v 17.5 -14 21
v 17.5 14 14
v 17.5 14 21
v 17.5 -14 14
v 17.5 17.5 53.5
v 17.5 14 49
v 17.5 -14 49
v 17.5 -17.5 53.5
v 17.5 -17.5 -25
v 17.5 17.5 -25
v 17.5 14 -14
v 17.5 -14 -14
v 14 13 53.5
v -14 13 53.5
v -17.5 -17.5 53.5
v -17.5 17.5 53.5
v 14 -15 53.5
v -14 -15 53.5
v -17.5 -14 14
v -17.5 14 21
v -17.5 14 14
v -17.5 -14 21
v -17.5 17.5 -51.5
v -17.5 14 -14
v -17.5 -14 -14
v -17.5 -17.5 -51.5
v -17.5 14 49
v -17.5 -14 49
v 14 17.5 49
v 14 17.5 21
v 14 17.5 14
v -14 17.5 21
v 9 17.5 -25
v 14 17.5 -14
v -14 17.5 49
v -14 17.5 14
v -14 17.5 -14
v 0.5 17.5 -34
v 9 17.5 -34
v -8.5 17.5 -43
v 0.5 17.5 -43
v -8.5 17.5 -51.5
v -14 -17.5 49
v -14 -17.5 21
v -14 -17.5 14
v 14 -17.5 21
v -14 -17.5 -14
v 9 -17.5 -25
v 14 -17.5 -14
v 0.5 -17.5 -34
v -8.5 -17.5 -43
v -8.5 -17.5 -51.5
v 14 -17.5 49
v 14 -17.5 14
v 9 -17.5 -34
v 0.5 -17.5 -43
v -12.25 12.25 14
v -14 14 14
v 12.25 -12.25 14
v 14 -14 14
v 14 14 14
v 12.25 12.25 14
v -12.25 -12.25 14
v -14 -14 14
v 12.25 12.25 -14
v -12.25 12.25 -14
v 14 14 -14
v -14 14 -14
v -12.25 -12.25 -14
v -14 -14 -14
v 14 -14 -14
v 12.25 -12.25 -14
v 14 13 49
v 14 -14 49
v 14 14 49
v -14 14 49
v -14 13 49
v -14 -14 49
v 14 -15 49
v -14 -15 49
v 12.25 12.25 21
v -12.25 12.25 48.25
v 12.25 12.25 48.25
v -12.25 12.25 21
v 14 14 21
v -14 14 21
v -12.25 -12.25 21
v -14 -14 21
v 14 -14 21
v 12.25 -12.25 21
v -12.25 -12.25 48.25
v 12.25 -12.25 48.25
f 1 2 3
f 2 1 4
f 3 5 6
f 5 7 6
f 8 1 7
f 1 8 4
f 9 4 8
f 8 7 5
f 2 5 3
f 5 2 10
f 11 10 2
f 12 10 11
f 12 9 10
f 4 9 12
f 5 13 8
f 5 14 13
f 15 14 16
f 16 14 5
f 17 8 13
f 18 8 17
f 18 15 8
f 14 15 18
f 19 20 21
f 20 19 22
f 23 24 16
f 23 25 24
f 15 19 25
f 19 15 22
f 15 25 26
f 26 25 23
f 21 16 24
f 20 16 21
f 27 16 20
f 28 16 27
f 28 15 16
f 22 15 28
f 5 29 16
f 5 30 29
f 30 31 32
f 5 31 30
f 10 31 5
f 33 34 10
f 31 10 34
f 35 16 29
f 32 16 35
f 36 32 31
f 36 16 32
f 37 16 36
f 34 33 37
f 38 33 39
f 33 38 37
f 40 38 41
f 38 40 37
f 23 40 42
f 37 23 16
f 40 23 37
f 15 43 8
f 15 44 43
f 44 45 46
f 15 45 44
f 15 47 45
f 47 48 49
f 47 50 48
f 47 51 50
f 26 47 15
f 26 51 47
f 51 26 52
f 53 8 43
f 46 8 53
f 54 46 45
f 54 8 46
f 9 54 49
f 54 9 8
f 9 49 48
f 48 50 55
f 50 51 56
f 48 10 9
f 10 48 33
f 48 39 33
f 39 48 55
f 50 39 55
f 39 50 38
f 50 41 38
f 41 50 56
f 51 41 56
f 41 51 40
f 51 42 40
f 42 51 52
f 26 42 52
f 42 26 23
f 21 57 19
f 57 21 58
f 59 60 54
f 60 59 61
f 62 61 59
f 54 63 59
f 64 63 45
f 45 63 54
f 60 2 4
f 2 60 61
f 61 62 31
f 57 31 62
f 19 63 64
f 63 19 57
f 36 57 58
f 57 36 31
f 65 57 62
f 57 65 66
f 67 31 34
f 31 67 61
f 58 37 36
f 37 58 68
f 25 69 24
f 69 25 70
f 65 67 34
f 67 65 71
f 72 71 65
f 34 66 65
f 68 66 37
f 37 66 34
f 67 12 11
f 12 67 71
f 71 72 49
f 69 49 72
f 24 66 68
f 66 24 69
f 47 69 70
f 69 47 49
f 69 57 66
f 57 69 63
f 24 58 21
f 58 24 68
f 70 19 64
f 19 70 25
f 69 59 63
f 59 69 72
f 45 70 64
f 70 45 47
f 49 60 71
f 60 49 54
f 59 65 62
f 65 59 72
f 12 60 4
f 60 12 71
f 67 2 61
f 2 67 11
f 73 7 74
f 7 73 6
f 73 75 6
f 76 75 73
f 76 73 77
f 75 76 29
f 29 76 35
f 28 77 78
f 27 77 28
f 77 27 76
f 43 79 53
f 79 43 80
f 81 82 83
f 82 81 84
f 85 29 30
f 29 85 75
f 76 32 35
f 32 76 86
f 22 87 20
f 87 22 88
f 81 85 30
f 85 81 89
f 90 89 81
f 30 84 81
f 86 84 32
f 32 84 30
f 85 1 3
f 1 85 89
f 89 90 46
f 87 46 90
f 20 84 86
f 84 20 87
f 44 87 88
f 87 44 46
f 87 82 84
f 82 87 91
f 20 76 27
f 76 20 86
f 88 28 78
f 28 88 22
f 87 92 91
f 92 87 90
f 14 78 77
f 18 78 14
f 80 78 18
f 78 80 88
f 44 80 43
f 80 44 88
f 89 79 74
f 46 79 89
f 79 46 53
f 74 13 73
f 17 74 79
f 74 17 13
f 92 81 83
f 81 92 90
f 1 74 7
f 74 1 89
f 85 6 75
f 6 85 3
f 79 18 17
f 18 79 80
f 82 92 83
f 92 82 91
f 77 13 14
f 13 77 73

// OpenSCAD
// file: modules.scad
offset = [0,8,0];
zoom = [0.8,0.8,1];

module white( filename, text)
{
    translate([0,4,0])   scale(zoom)
    rotate([180,0,-90]) 
    union(){ 
        translate([-14,-6.4,-2.5])   rotate([0,0,90])  linear_extrude(5)  text (text,font="bold",size=3.5); 
        intersection() 
        {    
            cube([35,35,5],center=true); 
            translate([1.5,0,2.6])   scale([0.14,0.14,-1])surface(file = filename, center = true); 
        } 
    } 

};

module black( filename, text)
{
    translate([0,4,0])   scale(zoom)
    rotate([180,0,-90]) 
    difference() 
    {    
        cube([35,35,5],center=true); 
        translate([1.5,0,2.6])    scale([0.14,0.14,-1]) surface(file = filename, center = true);
        translate([-14,-6.4,-2.5])   rotate([0,0,90])  linear_extrude(6)  text (text,font="bold",size=3.5);
    } 
}

module shape()
{
    translate([0,8,0])   scale(zoom) rotate([180,0,0]) 
    {
        rotate([0,0,90]) translate([5,0,0])  cube([35,35,5.5],center=true);  
        // use for help
//        linear_extrude(5)  translate([-9,-4,0])   text("B",size=20);
    }
}

module cube_appendix()
{
    difference()
    {
        union()
        {
            translate([0,0,1])
            {
                cube([35,35,35],center=true);
                 translate([0,0,7]) cylinder(r=10,h=30,center=true);
            }
        }
        translate([0,0,-24]) cylinder(r=10,h=30,center=true);
    }
}

module blue_stairs()
{
        union()
        {
            translate([0,0,1])cube([35,35,35],center=true);
            translate([0,0,-20.5])cube([35,35,9],center=true);            
            translate([-4.25,0,-29.5])cube([35-8.5,35,9],center=true);            
            translate([-8.5,0,-29.5-9])cube([35-17,35,9],center=true);            
            translate([-13,0,-29.5-17.5])cube([35-26,35,9],center=true);            

        }
}

module green_stairs()
{
        union()
        {
            translate([0,0,1+35/2])cube([35,35,70],center=true);
            translate([0,0,-20.5])cube([35,35,9],center=true);            
            translate([-4.25,0,-29.5])cube([35-8.5,35,9],center=true);            
            translate([-8.5,0,-29.5-9])cube([35-17,35,9],center=true);            
            translate([-13,0,-29.5-17.5])cube([35-26,35,9],center=true);            

        }
}

module support()
{
    difference()
    {
        translate([10,-1.5,-12])
        {
            difference()
            {
                cube([211,51.5,22],center=true);
                translate([0,0,17]) cube([211,40,20],center=true);
                
                
            }
        }
        translate([106-8,-2.5,-10])    cylinder(r=11,h=10,$fn=50);
        translate([70.6-8,-2.5,-10])    cylinder(r=11,h=10,$fn=50);
        translate([35.3-8,-2.5,-10])    cylinder(r=11,h=10,$fn=50);
        translate([-8,-2.5,-10])    cylinder(r=11,h=10,$fn=50);
        translate([-43,-2.5,-10])    cylinder(r=11,h=10,$fn=50);
        translate([-78,-2.5,-10])    cylinder(r=11,h=10,$fn=50);
    }
}

module tower()
{
    difference()
    {
        union()
        {
            translate([0,0,3-35/2])cube([35,35,70],center=true);
            translate([0,0,20])    cylinder(r=10,h=5,$fn=50);
        }
        translate([0,0,-50])    cylinder(r=10,h=10,$fn=50);
    }
}

module character()
{
    union()
    {
        translate([0,0,10])    cylinder(r1=13,r2=8,h=25,$fn=50);    
        translate([0,0,37.5])    
        {
            cylinder(r1=12,r2=1,h=5,$fn=50);
            scale([1,1,-1]) cylinder(r1=12,r2=1,h=5,$fn=50);
        }
        
        translate([0,0,50]) sphere(r=12,$fn=50);
    }    
}
// main file
include <modules.scad>

difference()
{
    green_stairs();
    translate([0,0,0])      union() color([0,1,0])
    {
        rotate([90,0,0])
        {
            translate([0,-4,-15])       shape();  
            rotate([0,90,0])   translate([0,-4,-15])              shape();  
            rotate([0,180,0])   translate([0,-4,-15])              shape();  
            rotate([0,270,0])   translate([0,-4,-15])              shape();  
        }
    }
    translate([0,0,35])      union() color([0,1,0])
    {
        rotate([0,180,0])   translate([0,-5,-16])              shape();  
        rotate([90,0,0])
        {
            translate([0,-4,-15])       shape();  
            rotate([0,90,0])   translate([0,-4,-15])              shape();  
            rotate([0,180,0])   translate([0,-4,-15])              shape();  
            rotate([0,270,0])   translate([0,-4,-15])              shape();  
        }
    }
}
